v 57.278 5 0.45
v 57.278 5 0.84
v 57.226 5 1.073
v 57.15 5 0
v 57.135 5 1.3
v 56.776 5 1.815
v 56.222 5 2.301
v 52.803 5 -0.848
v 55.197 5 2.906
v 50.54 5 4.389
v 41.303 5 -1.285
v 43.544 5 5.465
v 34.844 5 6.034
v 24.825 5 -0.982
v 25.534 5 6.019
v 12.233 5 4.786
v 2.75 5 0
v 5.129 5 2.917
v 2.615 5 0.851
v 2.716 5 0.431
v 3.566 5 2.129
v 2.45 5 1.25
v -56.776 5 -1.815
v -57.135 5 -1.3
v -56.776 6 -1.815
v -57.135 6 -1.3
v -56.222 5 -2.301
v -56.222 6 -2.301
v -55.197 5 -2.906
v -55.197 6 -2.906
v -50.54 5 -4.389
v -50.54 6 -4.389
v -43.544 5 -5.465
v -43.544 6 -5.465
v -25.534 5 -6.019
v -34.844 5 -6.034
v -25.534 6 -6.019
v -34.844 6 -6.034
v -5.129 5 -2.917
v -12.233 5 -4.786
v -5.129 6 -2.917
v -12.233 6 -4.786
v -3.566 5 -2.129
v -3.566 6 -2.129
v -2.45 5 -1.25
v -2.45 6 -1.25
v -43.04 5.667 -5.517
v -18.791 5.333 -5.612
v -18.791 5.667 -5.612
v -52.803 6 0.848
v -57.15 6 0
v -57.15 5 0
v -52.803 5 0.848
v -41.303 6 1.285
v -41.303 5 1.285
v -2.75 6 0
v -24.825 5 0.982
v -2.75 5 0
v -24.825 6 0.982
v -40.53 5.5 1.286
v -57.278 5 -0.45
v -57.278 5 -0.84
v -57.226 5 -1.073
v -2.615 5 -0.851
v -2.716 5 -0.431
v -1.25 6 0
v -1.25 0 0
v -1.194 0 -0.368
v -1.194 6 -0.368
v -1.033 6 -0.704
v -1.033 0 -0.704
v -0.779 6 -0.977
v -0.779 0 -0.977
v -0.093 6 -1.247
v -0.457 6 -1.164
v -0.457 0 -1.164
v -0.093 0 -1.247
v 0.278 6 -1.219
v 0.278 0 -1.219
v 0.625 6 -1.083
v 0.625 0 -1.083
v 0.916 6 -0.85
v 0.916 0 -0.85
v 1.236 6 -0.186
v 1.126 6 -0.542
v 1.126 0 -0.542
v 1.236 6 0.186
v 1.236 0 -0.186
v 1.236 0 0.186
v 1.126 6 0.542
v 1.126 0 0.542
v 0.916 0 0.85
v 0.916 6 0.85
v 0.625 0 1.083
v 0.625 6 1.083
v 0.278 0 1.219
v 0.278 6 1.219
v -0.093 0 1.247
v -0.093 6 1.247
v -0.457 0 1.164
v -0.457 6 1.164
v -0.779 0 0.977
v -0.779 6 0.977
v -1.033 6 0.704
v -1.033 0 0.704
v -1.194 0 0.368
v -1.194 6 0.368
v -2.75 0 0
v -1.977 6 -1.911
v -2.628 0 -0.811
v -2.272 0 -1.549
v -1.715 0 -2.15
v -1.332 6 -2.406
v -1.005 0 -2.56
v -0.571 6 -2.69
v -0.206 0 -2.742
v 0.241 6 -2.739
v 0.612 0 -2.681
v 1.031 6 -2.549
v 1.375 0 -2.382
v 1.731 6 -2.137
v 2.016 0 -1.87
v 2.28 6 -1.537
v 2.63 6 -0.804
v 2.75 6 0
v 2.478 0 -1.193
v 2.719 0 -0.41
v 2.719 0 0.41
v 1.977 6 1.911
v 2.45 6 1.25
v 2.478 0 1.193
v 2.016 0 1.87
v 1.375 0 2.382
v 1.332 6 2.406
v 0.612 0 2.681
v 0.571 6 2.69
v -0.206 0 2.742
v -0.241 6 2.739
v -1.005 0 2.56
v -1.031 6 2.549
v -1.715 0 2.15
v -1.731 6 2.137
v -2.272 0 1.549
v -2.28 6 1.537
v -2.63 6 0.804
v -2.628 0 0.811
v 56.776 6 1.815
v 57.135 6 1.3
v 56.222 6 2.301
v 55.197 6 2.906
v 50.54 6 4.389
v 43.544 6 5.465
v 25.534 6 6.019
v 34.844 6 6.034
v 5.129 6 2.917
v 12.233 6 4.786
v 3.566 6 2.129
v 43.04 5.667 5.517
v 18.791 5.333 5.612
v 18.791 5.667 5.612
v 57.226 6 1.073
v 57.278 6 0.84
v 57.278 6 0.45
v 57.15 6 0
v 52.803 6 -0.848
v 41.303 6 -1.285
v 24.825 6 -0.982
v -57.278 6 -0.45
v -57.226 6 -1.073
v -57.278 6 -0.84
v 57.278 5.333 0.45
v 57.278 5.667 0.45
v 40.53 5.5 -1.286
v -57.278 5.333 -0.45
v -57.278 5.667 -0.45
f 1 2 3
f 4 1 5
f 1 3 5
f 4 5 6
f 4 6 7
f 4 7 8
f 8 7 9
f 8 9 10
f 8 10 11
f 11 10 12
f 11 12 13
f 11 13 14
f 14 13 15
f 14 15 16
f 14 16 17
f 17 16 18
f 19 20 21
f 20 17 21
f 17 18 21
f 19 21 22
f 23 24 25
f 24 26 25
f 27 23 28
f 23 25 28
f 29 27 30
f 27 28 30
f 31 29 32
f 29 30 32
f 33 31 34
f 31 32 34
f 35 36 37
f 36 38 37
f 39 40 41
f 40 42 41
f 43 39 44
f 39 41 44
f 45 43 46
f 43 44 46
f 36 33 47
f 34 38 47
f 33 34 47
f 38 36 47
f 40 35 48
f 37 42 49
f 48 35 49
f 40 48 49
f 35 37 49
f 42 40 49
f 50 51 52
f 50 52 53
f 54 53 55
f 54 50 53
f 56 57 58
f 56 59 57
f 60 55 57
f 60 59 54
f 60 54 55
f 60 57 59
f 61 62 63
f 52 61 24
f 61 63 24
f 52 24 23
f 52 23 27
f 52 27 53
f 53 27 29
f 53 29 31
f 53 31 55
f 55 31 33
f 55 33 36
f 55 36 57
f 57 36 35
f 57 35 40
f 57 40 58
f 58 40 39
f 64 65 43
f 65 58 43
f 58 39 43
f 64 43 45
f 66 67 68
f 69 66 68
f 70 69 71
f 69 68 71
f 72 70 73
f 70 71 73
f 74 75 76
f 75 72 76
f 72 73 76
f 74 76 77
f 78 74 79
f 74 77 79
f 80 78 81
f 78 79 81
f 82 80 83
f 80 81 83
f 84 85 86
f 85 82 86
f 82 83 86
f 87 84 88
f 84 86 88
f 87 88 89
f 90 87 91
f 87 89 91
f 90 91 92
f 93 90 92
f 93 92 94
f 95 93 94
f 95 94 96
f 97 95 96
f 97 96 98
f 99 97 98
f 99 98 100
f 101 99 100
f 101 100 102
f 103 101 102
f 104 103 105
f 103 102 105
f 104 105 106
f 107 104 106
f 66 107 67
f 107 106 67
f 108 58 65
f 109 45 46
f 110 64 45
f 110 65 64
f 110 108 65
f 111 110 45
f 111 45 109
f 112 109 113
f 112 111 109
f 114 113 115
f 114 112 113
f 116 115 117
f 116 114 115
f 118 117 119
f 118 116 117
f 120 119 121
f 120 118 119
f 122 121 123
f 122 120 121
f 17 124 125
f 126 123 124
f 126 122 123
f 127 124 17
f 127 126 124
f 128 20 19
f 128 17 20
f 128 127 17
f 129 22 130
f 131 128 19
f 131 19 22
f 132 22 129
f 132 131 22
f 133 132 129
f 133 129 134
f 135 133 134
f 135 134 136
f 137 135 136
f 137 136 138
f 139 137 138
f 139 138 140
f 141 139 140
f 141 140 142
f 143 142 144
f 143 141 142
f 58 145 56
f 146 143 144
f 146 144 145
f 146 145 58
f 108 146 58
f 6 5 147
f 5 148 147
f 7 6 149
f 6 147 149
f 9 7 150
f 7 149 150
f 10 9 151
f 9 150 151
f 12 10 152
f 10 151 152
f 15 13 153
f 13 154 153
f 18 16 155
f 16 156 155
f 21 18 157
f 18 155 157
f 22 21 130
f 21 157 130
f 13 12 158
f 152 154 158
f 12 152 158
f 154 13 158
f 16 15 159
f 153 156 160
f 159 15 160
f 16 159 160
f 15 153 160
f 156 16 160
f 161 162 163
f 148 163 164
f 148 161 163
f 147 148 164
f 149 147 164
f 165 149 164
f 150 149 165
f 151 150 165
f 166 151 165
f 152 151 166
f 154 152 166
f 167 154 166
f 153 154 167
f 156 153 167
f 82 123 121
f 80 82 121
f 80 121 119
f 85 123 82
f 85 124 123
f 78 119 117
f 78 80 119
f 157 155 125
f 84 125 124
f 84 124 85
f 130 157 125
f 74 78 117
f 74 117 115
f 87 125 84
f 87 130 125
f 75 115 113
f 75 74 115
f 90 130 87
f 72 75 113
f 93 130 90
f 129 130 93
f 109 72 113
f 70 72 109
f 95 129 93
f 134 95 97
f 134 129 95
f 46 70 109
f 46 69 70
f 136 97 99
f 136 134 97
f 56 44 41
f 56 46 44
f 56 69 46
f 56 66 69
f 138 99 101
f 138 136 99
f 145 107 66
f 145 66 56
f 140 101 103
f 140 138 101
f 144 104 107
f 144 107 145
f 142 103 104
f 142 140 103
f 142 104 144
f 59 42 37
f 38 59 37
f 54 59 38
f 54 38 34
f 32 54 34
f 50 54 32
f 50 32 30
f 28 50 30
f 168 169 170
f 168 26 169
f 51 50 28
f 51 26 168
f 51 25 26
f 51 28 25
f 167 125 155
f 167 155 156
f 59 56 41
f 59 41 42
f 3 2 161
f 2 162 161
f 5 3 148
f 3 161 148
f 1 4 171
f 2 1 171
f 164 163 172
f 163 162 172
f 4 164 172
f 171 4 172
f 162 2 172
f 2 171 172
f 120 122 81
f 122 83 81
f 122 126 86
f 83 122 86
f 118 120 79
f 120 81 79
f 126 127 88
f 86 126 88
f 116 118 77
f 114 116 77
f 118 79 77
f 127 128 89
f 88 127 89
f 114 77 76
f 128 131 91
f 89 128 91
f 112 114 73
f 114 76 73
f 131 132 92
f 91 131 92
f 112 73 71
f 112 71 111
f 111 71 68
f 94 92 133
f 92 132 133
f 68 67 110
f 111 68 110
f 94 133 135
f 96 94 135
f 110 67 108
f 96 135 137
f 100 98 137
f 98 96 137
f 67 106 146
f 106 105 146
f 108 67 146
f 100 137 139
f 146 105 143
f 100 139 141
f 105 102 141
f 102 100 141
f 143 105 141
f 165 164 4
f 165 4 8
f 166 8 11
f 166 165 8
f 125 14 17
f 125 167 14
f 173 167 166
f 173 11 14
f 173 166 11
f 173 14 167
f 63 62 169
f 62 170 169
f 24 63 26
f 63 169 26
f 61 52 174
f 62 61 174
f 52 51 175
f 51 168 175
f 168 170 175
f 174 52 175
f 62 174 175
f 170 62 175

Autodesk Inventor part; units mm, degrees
ref_plane "YZ Plane" through (0, 0, 0) normal (1, 0, 0) x (0, 1, 0)
ref_plane "XZ Plane" through (0, 0, 0) normal (0, 1, 0) x (-1, 0, 0)
ref_plane "XY Plane" through (0, 0, 0) normal (0, 0, 1) x (1, 0, 0)
sketch "Esquisse1" plane through (0, 0, 0) normal (0, 1, 0) x (-1, 0, 0)
  circle A0 centre (0, 0) radius 1.25
  circle A1 centre (0, 0) radius 2.75
  dimension "d0" = 2.5
  dimension "d1" = 5.5
extrude "Extrusion1" add sketch "Esquisse1" along normal blind 6
sketch "Esquisse2" plane through (0, 6, 0) normal (0, 1, 0) x (1, 0, 0)
  circle A0 centre (0, 0) radius 2.75 projected
  circle A1 centre (0, 0) radius 57.15
  spline S0 degree 3 poles (-57.15, 0) (-60.3141, 7.3699) (-9.2386, 8.3963) (-2.4495, 1.25) knots 0 0 0 0 1 1 1 1
  spline S1 degree 2 poles (-57.15, 0) (-51.1105, -2.5712) (-2.75, 0) knots 0 0 0 1 1 1
  point P0 (-55.0001, 3)
  point P1 (-25, 6)
  point P2 (-51, -1)
  dimension "d4" = 114.3
extrude "Extrusion2" add sketch "Esquisse2" against normal blind 1 contours A0 S1 A1 S0 | A1 S0 picked at (-21.1571, 1.4807)
pattern_circular "Réseau circulaire1" count 2 over 360 about axis through (0, 0, 0) along (0, -1, 0) of "Extrusion2"
properties part number "Helice 4.5x4.5" material "Plastique ABS"
